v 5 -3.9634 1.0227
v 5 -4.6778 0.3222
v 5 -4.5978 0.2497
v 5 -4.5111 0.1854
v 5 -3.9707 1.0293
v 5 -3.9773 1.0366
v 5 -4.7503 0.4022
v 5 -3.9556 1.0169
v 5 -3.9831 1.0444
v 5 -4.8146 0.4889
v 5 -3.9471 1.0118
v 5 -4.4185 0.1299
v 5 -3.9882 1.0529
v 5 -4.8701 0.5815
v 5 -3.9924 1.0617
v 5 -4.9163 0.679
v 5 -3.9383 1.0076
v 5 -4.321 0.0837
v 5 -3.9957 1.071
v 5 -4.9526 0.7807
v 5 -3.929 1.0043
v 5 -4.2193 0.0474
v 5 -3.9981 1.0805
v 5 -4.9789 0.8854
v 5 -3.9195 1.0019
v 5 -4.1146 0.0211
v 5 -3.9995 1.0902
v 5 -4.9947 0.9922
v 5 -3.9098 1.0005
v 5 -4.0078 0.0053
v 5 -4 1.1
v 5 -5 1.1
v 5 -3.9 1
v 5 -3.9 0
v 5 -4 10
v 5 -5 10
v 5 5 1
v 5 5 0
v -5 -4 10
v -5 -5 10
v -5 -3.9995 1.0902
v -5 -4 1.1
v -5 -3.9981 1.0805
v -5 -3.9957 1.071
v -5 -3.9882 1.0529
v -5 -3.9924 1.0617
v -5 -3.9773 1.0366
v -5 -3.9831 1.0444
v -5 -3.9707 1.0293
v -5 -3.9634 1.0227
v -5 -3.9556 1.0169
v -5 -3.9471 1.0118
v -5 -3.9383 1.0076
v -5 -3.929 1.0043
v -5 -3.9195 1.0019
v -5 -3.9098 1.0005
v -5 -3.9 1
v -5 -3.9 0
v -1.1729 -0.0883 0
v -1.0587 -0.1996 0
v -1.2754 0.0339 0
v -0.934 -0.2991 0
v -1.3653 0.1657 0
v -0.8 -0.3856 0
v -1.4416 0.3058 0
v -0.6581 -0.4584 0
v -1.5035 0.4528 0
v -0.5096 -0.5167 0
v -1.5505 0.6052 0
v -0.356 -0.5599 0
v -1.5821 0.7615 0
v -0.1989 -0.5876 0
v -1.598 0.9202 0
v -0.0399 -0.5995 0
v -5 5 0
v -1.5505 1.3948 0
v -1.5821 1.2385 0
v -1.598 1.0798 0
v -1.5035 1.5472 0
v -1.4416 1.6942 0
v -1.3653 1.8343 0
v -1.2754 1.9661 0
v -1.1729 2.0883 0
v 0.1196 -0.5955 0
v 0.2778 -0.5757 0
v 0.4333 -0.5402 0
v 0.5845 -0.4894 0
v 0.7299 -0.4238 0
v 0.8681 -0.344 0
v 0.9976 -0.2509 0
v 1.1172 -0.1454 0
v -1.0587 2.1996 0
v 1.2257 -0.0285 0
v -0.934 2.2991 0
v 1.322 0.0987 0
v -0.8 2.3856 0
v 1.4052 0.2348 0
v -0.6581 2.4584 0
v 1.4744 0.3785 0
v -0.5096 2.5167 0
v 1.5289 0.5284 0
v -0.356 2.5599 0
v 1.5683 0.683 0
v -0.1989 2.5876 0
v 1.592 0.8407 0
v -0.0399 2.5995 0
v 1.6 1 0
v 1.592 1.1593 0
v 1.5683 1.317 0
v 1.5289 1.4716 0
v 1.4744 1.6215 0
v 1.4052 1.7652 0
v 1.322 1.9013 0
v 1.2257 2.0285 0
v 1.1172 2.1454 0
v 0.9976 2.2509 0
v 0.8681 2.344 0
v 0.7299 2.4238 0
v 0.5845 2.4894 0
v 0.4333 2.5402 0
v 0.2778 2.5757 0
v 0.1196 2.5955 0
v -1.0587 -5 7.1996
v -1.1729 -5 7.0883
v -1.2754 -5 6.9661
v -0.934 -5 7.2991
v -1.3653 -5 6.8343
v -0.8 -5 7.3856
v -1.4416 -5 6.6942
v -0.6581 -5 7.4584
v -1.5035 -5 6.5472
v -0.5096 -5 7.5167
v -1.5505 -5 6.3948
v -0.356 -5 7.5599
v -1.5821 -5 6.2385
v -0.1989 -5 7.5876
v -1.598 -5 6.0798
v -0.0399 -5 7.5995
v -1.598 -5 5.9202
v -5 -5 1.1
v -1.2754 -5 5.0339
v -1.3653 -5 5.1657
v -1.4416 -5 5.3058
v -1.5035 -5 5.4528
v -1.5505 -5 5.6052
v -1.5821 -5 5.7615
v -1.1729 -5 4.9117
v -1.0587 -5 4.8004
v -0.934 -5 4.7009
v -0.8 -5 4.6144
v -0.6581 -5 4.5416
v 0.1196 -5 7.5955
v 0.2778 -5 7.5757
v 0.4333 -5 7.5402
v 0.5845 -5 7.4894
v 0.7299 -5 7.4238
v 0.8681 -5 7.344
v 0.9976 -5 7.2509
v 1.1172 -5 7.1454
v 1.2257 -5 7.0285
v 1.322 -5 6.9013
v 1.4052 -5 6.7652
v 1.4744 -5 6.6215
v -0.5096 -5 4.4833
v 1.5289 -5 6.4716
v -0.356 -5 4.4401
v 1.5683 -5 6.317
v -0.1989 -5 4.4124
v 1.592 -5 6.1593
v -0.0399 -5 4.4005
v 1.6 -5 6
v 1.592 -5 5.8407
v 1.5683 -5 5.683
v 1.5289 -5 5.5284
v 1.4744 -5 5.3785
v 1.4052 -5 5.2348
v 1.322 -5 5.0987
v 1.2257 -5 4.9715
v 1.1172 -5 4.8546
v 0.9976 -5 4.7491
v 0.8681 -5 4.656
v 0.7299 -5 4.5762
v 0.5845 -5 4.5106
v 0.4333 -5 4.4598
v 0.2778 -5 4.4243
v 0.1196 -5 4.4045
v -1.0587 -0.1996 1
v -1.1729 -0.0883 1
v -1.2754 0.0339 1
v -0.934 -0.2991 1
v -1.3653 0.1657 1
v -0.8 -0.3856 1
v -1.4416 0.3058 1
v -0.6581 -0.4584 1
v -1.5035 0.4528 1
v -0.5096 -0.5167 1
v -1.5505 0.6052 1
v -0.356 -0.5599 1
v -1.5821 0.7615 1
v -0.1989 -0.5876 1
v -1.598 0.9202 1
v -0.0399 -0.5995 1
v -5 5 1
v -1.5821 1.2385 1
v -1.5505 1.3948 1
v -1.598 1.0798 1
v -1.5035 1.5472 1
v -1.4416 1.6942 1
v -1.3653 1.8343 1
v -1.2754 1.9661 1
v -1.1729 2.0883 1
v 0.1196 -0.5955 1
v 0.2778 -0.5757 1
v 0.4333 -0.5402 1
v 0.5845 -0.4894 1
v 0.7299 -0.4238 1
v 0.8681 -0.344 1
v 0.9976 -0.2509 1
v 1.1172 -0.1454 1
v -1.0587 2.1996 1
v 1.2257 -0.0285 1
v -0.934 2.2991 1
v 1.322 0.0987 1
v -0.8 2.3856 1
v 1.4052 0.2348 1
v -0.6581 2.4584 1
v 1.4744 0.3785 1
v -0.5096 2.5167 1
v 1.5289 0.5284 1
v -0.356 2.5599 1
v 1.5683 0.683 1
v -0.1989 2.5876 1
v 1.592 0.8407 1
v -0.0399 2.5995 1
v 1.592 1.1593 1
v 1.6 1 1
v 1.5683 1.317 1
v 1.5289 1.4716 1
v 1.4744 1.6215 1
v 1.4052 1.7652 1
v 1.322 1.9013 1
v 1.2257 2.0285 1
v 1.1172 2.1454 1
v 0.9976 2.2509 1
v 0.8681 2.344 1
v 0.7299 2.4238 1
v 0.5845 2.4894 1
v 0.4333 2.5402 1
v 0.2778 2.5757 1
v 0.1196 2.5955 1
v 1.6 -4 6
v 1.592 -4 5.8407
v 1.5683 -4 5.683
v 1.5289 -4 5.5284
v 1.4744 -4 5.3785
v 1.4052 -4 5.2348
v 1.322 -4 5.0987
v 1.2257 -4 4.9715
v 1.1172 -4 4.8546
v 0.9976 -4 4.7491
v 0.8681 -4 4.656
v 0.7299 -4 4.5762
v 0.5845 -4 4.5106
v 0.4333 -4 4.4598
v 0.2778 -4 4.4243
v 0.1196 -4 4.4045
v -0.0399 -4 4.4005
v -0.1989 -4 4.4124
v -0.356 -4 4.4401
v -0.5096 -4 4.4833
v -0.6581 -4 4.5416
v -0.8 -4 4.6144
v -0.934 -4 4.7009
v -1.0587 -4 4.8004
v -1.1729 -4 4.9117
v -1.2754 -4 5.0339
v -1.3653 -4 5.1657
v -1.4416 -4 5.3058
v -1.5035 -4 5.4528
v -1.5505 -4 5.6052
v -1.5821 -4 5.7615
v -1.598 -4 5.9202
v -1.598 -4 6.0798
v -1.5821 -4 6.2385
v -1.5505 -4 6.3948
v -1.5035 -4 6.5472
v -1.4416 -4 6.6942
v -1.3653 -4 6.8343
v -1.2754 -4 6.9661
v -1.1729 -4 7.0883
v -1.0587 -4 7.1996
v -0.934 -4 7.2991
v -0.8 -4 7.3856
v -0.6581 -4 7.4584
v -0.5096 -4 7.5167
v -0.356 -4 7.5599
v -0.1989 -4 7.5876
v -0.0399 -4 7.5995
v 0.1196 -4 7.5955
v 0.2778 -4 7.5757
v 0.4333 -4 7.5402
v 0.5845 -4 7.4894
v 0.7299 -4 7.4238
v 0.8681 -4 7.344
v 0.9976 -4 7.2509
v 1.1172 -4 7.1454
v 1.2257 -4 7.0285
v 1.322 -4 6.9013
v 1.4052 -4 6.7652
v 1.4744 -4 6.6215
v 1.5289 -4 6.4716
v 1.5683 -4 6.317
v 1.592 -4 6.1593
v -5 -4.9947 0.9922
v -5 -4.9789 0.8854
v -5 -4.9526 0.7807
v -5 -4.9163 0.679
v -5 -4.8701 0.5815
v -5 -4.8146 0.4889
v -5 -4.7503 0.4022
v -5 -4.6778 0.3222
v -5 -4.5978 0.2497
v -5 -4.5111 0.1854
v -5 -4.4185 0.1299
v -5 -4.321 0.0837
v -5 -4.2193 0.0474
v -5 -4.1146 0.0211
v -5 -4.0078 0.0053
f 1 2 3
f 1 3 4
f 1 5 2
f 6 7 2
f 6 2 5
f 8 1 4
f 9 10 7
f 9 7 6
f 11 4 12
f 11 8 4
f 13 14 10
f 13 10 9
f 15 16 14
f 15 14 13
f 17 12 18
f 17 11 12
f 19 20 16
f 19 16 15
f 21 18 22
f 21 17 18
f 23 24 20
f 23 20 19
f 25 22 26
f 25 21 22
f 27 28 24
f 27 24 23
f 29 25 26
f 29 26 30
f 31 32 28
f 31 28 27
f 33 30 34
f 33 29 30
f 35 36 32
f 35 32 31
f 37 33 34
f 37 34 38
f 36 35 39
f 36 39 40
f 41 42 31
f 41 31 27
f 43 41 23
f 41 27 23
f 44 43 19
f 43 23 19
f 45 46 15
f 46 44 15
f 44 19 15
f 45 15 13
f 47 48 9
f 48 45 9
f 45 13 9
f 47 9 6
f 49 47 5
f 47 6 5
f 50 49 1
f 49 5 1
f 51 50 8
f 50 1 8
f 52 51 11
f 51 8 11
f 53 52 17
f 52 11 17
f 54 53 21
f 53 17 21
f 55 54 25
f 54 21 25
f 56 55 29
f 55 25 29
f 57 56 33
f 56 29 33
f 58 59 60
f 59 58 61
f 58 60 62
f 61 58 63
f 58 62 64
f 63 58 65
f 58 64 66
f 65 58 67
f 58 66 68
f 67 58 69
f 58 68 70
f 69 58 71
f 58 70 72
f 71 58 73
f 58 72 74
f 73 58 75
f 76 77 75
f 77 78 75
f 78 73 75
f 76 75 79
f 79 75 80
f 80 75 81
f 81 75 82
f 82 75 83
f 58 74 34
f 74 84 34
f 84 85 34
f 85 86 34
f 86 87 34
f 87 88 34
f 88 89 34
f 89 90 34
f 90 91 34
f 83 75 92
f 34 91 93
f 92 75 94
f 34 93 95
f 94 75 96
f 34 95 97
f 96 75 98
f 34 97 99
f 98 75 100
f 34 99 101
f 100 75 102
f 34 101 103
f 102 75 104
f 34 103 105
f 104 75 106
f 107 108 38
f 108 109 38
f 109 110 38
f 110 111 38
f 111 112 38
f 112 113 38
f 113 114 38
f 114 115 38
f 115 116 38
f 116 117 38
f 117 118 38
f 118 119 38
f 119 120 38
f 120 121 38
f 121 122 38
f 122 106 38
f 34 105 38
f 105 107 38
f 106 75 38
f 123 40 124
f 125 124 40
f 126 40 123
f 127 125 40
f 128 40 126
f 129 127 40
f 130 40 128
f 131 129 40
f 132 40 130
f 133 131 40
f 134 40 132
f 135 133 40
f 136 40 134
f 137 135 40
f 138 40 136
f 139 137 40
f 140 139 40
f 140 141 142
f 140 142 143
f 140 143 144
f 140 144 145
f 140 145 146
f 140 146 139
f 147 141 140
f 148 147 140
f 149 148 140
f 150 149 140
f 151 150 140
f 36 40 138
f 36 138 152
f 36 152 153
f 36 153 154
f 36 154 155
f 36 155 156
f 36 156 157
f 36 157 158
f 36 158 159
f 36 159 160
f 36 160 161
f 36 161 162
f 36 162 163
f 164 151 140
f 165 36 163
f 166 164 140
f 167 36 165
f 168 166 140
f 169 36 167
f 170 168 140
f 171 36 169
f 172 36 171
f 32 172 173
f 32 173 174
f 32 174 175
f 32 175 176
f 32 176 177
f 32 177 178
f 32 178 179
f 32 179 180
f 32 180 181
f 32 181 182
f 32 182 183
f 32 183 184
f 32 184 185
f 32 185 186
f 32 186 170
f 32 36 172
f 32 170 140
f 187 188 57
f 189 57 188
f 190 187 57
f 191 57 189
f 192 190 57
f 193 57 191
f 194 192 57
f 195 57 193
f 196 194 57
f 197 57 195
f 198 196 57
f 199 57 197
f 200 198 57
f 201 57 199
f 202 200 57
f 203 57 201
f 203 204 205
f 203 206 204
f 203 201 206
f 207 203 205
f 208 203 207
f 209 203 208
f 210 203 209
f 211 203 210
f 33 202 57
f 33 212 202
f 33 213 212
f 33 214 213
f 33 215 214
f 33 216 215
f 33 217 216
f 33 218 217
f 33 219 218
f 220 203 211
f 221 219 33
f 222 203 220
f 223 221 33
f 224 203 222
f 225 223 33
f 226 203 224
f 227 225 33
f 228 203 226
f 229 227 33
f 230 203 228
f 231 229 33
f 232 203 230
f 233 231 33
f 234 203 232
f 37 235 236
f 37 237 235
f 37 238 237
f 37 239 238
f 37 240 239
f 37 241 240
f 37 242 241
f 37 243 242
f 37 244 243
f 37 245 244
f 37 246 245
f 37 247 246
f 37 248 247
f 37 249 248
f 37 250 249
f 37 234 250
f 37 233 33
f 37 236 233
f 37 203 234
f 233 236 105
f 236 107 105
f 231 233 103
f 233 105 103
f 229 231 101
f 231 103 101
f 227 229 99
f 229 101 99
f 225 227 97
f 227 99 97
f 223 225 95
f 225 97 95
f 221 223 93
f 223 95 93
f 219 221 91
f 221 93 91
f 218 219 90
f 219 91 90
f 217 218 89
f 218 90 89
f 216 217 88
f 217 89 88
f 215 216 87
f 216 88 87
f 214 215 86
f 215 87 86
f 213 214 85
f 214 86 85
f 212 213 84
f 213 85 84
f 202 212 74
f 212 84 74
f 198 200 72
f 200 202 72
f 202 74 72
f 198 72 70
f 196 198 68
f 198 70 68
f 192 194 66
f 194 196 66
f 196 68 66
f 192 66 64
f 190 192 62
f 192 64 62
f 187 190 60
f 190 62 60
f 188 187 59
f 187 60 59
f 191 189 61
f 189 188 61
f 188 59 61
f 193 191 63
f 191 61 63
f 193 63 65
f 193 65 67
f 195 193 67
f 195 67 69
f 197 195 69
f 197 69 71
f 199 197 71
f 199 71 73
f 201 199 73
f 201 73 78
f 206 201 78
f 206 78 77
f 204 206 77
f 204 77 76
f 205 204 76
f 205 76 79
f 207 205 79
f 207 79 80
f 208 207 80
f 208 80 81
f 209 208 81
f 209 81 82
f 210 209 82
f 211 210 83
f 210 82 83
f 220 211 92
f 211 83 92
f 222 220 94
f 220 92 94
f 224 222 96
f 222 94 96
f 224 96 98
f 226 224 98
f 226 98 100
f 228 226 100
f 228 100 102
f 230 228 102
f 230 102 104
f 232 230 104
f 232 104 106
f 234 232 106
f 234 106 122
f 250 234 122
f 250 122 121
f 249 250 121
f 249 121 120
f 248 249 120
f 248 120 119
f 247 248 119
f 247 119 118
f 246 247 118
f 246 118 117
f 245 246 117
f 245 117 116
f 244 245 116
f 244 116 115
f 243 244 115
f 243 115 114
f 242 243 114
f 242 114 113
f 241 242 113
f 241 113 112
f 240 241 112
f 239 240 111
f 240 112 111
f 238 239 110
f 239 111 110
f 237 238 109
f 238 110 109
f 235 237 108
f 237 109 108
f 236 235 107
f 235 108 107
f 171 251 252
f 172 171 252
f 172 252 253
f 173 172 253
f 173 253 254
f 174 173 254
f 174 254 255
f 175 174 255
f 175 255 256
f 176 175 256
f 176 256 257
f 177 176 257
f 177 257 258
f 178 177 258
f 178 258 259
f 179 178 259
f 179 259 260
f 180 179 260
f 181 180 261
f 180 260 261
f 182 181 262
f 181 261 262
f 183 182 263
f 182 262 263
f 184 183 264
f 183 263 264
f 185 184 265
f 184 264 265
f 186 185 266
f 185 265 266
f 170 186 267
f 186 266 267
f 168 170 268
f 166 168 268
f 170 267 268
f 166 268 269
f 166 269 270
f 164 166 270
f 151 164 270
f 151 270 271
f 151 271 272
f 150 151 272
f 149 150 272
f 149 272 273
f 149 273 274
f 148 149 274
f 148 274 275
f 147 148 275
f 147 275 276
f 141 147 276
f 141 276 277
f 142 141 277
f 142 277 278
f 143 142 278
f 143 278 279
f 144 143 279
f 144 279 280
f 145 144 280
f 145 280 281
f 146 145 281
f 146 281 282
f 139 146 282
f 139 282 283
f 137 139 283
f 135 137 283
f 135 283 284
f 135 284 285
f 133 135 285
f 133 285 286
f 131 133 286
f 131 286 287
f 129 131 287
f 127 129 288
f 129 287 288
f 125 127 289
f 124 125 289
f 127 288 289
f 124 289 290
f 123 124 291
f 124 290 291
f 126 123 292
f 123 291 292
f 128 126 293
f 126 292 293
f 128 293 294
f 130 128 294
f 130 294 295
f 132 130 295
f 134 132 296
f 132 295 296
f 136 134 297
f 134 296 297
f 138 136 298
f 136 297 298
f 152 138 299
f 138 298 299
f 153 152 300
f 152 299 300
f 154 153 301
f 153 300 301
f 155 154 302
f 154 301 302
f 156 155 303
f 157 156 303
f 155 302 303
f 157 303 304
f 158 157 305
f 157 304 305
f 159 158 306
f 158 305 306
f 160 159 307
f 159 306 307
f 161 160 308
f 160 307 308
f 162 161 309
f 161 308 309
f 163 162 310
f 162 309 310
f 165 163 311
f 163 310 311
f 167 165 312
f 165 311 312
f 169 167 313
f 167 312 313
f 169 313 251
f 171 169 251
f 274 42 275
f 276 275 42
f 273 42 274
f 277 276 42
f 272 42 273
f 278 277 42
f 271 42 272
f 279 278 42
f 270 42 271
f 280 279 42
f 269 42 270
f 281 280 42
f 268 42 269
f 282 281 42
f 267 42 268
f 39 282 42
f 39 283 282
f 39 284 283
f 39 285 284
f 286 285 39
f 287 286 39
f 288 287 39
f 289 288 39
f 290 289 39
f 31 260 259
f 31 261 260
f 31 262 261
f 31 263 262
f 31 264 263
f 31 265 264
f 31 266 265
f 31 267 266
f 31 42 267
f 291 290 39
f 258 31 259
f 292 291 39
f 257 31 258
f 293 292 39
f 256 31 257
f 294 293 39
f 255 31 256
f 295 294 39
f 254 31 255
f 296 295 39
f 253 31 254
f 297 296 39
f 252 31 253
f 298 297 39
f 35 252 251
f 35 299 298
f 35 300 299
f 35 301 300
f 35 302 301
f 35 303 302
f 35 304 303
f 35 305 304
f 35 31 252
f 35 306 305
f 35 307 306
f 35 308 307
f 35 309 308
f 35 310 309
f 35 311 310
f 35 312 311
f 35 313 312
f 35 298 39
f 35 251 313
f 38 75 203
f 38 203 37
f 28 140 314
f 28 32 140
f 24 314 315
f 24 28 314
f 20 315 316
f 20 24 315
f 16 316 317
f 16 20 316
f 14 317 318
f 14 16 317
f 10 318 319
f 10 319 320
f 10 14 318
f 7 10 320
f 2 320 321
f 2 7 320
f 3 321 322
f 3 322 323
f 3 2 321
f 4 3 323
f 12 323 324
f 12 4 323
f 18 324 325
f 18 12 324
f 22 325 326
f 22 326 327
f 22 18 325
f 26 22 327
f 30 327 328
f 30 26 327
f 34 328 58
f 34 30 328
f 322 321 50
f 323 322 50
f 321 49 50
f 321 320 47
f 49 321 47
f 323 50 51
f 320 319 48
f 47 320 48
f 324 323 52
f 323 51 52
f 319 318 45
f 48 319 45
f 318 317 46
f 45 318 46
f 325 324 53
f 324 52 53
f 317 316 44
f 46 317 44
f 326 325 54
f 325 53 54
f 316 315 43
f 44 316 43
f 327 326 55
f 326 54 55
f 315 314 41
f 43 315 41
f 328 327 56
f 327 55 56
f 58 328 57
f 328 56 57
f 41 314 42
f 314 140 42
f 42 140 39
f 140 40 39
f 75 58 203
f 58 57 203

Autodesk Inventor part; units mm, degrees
ref_plane "YZ Plane" through (0, 0, 0) normal (1, 0, 0) x (0, 1, 0)
ref_plane "XZ Plane" through (0, 0, 0) normal (0, 1, 0) x (-1, 0, 0)
ref_plane "XY Plane" through (0, 0, 0) normal (0, 0, 1) x (1, 0, 0)
sketch "Sketch1" plane through (0, 0, 0) normal (0, 0, 1) x (1, 0, 0)
  line L0 (-5, 5) -> (5, 5)
  line L1 (5, 5) -> (5, -5)
  line L2 (5, -5) -> (-5, -5)
  line L3 (-5, -5) -> (-5, 5)
  line L4 (-5, 5) -> (5, -5) construction
  line L5 (5, 5) -> (-5, -5) construction
  circle A0 centre (0, 1) radius 1.6
  point P0 (0, 0)
  dimension "d0" = 10
  dimension "d1" = 10
  dimension "d3" = 3.2
  dimension "d21" = 4
extrude "Plate1" add sketch "Sketch1" along normal blind 1
sketch "Sketch2" plane through (5, -4, 0) normal (0, -1, 0) x (1, 0, 0)
  line L0 (-10, 0) -> (0, 0)
  line L1 (0, 0) -> (0, 10)
  line L2 (0, 10) -> (-10, 10)
  line L3 (-10, 10) -> (-10, 0)
edge flange "Flange1" height 10 angle 90 thickness 1 bend radius 0.1 thickness toward (0, -1, 0) relief tear relief width 1 relief depth 0.5 edges at (0, -5, 1) wall of the first edge with corners at (-5, -4, 0) (5, -4, 0) (5, -4, 10) (-5, -4, 10)
bend "Bend1"
corner "Corner1"
sketch "Sketch3" plane through (-5, -4, 10) normal (0, 1, 0) x (1, 0, 0)
  circle A0 centre (5, 4) radius 1.6
  line L0 (0, 9) -> (10, 9) projected
  line L1 (0, 0) -> (10, 0) projected
  point P0 (5, 10)
  point P1 (5, 0)
  dimension "d17" = 3.2
  dimension "d22" = 4
extrude "Cut1" cut sketch "Sketch3" against normal blind 1
equation "\"d19\" = 厚度"
equation "\"d6\" = 厚度"
equation "\"d7\" = 折彎離隙寬度"
equation "\"d8\" = 折彎離隙深度"
equation "\"d9\" = 最小剩餘"
equation "\"d10\" = 轉移半徑"
equation "\"d14\" = 轉角離隙大小"
equation "\"d15\" = 間隙大小"
equation "\"d16\" = Jacobi半徑大小"
equation "\"折彎半徑\" = 厚度"
equation "\"折彎離隙寬度\" = 厚度"
equation "\"折彎離隙深度\" = 0.5 * 厚度"
equation "\"轉角離隙大小\" = 4 * 厚度"
equation "\"最小剩餘\" = 2 * 厚度"
equation "\"轉移半徑\" = 折彎半徑"
equation "\"Jacobi半徑大小\" = 折彎半徑"
equation "\"間隙大小\" = 厚度"
equation "\"厚度\" = 1"
properties part number "connector"
